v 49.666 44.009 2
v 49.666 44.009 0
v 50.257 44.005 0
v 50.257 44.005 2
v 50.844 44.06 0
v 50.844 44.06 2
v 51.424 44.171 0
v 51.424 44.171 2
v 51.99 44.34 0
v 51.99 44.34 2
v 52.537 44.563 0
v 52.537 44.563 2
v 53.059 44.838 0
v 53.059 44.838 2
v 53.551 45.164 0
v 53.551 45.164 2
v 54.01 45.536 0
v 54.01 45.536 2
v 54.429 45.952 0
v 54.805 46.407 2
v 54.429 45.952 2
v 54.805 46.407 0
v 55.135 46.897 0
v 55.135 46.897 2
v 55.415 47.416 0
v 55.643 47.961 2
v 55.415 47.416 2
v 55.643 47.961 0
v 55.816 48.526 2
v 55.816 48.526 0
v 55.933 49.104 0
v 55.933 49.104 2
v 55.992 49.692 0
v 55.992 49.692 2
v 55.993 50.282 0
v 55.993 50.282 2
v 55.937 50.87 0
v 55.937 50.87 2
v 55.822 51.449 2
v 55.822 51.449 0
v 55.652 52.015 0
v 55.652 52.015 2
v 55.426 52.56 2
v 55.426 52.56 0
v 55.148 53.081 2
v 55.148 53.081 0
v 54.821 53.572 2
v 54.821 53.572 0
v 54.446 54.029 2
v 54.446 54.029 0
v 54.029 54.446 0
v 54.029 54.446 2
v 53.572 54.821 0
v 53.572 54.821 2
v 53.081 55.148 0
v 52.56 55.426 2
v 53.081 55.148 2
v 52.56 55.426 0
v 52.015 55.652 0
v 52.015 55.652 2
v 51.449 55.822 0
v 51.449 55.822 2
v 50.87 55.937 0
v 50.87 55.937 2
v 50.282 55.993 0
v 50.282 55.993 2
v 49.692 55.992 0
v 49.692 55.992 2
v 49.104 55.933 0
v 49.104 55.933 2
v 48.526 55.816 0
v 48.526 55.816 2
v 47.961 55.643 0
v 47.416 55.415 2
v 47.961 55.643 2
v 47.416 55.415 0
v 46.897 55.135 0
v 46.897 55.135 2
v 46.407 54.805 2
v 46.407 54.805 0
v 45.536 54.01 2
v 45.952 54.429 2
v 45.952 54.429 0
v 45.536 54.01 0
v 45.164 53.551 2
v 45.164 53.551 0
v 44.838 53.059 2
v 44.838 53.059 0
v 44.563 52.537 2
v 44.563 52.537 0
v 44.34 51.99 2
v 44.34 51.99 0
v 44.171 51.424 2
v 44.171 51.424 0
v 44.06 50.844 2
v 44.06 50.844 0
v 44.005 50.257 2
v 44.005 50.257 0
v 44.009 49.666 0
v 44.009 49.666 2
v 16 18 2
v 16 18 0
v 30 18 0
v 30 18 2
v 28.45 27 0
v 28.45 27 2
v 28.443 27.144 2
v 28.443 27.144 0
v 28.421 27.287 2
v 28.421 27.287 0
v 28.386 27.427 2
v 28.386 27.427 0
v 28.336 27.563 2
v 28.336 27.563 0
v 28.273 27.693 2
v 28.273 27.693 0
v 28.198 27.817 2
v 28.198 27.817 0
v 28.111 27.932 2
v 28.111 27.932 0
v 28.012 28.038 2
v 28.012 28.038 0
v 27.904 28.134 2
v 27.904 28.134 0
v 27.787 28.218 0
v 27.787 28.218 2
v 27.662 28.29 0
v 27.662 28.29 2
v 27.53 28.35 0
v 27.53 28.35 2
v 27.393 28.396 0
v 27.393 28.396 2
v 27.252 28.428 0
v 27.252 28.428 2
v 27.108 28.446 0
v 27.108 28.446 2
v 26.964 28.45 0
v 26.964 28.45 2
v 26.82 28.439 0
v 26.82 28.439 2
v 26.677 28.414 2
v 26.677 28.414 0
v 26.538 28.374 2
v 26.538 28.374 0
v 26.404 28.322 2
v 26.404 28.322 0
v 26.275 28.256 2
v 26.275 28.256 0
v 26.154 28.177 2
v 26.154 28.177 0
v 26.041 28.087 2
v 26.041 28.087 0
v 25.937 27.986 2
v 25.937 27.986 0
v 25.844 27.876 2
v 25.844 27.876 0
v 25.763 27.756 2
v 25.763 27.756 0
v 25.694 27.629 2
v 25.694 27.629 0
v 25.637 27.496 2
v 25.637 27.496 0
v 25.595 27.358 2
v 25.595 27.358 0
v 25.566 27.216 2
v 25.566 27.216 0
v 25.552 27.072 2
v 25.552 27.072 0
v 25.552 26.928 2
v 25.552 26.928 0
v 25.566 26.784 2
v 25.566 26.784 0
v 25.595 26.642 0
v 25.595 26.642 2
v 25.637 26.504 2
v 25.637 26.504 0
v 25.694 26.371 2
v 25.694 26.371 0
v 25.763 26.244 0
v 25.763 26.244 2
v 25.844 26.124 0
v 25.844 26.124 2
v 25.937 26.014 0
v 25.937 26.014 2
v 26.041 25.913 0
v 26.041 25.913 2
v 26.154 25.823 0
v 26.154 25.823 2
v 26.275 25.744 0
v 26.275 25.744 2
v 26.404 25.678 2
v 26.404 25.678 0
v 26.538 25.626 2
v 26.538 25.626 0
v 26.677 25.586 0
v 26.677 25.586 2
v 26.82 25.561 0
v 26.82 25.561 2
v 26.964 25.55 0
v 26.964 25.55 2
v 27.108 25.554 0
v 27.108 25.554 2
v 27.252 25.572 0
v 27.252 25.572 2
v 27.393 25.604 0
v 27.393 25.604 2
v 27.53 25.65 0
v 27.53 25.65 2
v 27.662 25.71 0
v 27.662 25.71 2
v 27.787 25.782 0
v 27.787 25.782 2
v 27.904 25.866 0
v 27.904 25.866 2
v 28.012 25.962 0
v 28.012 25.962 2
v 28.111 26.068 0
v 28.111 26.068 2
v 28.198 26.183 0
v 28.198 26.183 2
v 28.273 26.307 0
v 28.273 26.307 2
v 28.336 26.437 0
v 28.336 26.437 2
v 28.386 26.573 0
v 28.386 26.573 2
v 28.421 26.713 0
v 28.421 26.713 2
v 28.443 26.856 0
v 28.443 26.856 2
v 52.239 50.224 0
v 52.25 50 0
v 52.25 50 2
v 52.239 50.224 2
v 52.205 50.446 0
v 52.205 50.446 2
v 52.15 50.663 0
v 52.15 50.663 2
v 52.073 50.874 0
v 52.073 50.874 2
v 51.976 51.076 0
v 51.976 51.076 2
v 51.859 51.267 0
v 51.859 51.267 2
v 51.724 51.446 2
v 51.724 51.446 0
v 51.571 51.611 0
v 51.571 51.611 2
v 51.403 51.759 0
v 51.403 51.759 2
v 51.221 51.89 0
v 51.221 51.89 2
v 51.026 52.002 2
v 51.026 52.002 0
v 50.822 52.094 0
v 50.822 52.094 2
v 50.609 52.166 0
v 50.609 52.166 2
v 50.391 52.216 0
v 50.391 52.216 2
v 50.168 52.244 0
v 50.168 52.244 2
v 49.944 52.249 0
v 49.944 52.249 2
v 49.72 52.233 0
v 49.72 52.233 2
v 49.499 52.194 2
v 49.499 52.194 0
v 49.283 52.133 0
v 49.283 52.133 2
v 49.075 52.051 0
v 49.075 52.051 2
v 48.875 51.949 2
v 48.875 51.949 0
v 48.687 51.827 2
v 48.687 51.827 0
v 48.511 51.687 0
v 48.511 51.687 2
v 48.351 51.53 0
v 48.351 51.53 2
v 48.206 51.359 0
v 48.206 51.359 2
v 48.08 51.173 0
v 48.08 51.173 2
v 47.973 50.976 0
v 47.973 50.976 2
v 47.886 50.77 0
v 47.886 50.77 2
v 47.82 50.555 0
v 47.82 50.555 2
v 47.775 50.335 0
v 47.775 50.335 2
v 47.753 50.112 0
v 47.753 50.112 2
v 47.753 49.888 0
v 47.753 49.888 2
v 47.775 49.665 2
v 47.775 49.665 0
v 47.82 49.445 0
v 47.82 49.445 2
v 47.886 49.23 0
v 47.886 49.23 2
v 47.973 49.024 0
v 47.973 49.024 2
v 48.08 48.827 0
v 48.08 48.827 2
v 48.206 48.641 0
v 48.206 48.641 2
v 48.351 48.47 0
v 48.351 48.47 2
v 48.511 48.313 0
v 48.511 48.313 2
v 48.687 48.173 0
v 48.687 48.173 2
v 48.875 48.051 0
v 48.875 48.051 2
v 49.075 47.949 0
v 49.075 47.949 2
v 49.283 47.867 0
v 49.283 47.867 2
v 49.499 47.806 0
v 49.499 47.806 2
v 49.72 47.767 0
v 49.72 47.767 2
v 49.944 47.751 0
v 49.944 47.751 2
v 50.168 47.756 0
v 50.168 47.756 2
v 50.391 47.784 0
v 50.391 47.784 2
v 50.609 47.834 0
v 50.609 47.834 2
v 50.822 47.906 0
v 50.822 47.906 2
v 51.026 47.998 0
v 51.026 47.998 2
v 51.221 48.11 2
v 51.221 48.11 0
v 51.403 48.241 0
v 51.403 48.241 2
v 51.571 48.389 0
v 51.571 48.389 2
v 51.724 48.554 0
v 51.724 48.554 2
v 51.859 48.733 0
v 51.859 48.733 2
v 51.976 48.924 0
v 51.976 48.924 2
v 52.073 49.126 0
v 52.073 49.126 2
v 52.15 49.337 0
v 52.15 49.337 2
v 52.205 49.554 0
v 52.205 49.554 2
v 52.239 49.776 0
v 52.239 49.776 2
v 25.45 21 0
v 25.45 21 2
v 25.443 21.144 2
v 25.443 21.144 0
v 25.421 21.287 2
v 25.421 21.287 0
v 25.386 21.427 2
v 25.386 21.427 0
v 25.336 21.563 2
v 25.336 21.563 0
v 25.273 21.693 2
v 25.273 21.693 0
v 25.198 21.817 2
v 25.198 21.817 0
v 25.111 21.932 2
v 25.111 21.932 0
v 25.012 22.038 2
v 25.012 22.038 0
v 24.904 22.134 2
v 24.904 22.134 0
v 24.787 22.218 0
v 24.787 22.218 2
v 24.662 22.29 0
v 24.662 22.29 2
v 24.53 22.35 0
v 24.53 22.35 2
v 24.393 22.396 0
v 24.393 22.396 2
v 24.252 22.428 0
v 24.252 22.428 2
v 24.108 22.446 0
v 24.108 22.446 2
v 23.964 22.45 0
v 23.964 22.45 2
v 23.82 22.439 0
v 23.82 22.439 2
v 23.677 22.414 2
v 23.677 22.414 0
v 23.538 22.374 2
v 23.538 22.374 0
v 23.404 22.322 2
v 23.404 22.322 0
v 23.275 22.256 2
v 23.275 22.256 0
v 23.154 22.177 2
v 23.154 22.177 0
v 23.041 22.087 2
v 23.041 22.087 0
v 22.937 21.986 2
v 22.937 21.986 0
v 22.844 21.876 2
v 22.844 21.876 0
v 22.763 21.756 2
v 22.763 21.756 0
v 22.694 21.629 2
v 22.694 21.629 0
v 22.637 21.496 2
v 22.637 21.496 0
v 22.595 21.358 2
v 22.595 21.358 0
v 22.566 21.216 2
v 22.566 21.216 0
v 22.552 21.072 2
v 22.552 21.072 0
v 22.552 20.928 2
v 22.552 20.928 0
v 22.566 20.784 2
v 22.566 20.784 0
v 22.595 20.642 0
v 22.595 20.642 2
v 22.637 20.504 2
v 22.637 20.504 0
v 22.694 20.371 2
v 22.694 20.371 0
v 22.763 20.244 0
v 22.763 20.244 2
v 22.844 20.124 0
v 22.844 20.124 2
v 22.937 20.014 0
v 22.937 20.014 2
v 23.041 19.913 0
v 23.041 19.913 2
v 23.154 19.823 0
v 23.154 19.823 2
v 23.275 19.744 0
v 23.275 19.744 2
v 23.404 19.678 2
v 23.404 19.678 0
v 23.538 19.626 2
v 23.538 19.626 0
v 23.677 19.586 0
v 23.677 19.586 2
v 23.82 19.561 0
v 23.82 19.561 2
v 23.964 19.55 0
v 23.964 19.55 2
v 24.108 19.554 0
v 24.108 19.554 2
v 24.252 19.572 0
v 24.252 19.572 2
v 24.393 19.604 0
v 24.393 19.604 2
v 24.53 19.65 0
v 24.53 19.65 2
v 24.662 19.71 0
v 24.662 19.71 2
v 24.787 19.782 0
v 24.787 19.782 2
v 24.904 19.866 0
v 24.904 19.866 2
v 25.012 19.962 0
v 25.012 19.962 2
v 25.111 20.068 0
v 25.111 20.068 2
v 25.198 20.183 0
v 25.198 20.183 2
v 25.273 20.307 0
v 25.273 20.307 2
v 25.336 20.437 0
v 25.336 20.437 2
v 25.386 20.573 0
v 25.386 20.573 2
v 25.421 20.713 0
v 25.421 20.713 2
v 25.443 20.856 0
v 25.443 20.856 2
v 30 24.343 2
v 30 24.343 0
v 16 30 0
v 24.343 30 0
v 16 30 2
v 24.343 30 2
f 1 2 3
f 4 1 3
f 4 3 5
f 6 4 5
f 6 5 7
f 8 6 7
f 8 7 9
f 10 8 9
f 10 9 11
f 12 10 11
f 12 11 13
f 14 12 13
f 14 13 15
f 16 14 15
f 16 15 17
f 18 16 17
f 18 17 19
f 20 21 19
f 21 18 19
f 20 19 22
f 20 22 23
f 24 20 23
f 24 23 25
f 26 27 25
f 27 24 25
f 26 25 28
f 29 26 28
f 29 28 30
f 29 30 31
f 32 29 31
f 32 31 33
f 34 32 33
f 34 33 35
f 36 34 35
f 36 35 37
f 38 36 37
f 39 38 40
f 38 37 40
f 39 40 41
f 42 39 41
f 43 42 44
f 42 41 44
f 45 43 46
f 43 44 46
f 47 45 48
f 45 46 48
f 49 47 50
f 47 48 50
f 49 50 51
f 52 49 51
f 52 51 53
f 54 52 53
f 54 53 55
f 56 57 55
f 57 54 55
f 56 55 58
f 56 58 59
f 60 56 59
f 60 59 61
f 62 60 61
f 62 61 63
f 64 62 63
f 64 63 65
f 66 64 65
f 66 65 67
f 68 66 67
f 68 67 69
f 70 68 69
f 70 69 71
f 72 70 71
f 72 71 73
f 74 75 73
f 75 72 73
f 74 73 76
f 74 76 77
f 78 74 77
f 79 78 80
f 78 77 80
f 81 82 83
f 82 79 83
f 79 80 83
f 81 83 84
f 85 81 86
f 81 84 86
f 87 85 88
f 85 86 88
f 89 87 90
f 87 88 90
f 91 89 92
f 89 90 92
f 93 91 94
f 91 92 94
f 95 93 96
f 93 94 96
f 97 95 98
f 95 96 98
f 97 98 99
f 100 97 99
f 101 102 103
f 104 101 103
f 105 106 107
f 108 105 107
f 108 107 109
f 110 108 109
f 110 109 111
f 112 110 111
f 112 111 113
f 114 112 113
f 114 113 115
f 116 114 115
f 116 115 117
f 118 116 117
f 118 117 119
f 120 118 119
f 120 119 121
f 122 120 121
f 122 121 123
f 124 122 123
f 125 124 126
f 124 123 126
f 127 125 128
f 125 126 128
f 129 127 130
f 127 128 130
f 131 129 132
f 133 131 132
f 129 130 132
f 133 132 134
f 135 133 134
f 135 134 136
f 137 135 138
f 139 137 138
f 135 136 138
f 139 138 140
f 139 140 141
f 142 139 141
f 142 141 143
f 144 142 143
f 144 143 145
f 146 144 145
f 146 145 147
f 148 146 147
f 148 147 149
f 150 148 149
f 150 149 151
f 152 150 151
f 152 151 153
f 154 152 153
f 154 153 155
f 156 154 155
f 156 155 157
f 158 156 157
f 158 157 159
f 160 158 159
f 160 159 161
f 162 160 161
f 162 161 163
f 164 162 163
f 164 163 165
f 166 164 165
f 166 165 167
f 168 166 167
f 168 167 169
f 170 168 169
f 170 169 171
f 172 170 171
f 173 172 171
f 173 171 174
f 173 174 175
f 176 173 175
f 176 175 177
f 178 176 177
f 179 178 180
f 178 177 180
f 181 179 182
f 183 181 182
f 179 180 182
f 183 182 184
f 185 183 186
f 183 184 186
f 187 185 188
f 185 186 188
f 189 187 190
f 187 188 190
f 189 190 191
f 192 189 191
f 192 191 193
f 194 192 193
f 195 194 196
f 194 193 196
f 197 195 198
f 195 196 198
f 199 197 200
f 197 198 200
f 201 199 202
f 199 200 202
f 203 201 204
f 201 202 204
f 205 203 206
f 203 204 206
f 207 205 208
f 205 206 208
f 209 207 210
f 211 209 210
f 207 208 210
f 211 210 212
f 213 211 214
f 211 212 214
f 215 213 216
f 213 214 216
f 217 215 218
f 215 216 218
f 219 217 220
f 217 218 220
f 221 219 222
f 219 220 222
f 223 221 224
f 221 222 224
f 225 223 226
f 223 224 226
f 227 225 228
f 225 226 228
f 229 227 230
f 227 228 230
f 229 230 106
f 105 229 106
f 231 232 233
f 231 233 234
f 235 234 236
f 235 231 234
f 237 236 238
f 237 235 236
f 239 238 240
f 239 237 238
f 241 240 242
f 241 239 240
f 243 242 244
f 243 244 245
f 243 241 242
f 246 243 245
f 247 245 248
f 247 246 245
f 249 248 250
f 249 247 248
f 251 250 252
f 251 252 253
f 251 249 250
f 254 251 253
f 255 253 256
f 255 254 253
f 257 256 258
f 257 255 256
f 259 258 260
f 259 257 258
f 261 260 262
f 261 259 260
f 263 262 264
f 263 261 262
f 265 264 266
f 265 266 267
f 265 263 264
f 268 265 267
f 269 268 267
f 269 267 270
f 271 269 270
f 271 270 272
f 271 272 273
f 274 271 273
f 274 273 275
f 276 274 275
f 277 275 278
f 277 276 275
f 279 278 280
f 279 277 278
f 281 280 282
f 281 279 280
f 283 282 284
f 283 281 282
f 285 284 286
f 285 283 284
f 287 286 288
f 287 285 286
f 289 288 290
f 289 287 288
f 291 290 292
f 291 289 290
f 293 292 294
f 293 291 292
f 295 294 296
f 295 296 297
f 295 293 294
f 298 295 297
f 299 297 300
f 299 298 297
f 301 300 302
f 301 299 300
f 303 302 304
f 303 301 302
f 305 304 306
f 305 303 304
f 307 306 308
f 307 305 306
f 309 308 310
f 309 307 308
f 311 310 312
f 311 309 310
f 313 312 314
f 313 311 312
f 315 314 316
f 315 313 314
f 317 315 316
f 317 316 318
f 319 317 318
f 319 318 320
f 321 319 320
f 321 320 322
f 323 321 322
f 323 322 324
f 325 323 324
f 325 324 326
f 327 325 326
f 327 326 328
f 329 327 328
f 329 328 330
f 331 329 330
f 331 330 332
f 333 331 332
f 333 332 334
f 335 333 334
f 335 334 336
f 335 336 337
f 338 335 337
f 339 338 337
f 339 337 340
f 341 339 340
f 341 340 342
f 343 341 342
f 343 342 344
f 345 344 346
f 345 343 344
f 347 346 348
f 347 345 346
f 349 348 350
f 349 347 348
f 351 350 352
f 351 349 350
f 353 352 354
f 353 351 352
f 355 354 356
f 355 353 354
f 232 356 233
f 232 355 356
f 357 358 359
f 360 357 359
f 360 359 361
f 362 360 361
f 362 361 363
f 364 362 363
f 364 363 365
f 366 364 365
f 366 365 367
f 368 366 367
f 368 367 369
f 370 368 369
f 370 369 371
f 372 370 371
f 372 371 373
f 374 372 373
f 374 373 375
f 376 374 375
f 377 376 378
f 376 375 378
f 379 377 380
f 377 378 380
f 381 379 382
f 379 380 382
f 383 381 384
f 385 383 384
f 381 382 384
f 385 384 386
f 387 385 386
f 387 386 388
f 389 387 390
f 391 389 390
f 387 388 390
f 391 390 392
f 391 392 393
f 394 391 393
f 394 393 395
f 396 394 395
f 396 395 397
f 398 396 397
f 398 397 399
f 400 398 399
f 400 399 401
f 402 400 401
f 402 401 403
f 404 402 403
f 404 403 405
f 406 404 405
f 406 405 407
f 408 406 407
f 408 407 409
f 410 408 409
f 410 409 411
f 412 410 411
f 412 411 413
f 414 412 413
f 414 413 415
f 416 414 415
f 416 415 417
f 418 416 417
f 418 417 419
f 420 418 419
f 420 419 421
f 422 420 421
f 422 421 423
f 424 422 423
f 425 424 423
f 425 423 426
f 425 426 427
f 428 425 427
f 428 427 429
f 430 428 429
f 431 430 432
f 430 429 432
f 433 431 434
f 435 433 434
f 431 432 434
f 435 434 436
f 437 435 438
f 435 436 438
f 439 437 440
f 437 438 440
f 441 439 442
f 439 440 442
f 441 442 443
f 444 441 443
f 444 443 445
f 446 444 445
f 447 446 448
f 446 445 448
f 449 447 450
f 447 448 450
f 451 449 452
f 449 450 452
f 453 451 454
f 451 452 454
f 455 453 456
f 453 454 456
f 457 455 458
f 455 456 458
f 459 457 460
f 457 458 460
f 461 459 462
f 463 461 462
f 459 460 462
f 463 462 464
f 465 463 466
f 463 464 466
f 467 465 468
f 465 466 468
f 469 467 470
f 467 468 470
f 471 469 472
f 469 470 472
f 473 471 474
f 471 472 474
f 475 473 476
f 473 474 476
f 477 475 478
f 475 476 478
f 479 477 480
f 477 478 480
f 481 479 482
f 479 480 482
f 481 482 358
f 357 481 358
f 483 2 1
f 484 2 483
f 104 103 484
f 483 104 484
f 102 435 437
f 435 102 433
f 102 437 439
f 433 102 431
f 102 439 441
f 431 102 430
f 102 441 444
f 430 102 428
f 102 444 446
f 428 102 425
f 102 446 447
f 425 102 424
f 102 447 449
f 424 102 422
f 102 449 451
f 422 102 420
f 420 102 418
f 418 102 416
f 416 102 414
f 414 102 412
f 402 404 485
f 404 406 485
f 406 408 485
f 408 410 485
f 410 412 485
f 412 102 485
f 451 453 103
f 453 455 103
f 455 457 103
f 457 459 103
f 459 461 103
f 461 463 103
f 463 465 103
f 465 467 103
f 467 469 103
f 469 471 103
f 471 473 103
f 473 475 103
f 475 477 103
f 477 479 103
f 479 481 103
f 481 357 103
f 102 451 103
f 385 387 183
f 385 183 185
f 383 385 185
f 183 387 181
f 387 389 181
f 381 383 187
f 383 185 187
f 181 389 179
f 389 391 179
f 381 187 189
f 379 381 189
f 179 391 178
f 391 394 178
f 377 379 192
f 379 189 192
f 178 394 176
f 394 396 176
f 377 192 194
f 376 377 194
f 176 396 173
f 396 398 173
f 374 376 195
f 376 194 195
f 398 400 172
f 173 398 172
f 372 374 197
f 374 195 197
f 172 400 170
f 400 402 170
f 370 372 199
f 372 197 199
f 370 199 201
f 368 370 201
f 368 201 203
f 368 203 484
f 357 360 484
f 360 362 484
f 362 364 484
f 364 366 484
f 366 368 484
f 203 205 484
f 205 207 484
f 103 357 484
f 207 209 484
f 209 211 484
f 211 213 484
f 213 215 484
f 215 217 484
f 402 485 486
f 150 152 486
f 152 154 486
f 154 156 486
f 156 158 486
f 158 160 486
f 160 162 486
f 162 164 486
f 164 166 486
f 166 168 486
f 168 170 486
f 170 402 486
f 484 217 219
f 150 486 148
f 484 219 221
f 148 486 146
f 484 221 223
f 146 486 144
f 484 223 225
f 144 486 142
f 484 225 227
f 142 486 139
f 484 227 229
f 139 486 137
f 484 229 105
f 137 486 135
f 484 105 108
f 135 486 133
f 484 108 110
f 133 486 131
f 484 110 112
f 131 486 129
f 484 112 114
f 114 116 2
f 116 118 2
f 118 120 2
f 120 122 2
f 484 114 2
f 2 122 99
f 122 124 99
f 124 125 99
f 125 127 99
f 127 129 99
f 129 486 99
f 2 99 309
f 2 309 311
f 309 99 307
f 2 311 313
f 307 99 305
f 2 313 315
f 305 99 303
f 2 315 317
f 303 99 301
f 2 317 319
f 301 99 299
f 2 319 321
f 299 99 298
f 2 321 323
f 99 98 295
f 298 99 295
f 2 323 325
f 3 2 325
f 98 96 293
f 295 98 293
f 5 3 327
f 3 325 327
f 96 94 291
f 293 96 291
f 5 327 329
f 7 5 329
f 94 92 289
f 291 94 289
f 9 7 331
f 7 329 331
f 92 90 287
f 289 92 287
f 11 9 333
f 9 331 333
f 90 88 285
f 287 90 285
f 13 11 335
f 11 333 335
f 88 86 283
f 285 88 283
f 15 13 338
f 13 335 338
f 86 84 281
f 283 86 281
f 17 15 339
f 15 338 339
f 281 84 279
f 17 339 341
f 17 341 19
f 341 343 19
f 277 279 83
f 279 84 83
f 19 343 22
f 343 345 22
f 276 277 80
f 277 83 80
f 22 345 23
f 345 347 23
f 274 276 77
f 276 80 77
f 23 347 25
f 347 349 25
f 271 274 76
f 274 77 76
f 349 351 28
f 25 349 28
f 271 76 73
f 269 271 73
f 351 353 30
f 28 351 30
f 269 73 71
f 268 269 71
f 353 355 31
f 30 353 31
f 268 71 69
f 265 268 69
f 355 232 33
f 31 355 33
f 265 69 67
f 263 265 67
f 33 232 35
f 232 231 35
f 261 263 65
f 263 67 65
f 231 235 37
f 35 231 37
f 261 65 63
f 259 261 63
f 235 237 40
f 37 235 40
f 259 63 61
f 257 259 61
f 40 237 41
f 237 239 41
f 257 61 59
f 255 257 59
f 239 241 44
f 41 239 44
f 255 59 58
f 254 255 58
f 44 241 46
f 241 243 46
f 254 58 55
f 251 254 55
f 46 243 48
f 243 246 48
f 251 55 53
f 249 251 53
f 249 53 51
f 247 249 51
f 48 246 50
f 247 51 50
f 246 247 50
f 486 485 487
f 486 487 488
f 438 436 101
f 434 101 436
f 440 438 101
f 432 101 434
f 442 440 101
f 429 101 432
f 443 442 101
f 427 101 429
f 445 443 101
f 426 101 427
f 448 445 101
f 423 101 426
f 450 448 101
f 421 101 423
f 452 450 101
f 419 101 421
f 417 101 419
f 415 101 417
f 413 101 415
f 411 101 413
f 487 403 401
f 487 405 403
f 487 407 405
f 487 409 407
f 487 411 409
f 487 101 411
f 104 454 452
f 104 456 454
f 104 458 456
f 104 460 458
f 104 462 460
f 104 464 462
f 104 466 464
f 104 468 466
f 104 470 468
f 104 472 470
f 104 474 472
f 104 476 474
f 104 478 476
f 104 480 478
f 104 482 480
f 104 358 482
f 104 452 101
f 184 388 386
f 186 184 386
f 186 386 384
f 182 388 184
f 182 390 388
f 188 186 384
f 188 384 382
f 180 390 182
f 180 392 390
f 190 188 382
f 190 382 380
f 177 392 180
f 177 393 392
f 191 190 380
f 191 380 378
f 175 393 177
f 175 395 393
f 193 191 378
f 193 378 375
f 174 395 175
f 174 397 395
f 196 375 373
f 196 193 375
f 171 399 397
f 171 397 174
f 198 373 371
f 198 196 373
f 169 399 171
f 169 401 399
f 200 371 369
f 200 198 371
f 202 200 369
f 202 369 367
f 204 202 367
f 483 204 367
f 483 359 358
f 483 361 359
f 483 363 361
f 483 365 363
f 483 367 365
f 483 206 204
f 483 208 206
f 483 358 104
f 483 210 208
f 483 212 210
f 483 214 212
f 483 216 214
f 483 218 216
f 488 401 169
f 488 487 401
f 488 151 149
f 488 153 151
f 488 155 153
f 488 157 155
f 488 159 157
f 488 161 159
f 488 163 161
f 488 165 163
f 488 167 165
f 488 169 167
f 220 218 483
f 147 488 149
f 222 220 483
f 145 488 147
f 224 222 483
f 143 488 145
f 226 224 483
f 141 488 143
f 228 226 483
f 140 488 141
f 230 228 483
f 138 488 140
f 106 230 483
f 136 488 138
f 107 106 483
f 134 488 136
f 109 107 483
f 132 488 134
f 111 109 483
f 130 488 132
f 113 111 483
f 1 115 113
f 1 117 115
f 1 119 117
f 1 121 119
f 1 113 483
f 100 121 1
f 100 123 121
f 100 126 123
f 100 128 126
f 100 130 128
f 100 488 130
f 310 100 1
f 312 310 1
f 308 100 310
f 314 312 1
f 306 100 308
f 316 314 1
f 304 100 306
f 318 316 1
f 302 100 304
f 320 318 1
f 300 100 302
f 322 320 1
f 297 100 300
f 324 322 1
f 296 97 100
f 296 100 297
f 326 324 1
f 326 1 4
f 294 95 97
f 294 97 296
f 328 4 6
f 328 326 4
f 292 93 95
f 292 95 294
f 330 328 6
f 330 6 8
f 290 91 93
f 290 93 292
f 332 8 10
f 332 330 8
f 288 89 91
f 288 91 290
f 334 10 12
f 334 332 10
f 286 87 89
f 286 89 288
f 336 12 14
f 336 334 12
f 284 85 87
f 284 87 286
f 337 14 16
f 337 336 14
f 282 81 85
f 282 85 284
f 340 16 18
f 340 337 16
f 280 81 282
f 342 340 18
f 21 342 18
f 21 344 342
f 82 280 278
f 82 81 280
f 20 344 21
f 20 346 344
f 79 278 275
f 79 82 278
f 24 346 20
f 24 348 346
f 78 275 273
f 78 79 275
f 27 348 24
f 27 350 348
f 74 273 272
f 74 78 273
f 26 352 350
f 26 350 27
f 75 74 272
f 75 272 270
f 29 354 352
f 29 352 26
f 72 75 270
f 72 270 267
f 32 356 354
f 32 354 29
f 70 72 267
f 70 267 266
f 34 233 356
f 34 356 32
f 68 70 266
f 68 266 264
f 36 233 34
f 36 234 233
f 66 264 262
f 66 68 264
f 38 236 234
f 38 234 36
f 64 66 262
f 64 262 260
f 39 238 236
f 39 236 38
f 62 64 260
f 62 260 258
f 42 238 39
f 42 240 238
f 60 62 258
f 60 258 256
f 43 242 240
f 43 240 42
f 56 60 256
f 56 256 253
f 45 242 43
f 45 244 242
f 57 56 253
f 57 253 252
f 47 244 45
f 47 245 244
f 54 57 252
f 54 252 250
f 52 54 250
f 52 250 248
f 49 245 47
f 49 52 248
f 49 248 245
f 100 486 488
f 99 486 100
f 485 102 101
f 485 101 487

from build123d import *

# Parameters (mm, degrees)
SKETCH1_R                         = 6
SKETCH1_R_2                       = 2.25
FOLLOWER_SEAT_D4P5_DEPTH          = 2
CARRIAGE_TO_FOLLOWER_BRIDGE_DEPTH = 2
SKETCH3_W                         = 14
SKETCH3_H                         = 12
CARRIAGE_ATTACHMENT_PAD_DEPTH     = 2
SKETCH5_R                         = 1.45
STOP_MOUNT_D2P9_THROUGH_DEPTH     = 2.01


with BuildPart() as part:
    # Sketch1 → Follower_Seat_D4p5 (new body)
    with BuildSketch(Plane.XY):
        with Locations((50, 50)):
            Circle(SKETCH1_R)
        with Locations((50, 50)):
            Circle(SKETCH1_R_2, mode=Mode.SUBTRACT)
    extrude(amount=FOLLOWER_SEAT_D4P5_DEPTH)

    # Sketch2 → Carriage_To_Follower_Bridge (add)
    with BuildSketch(Plane.XY):
        Polygon((21.171572875, 26.828427125), (44.171572875, 49.828427125), (49.828427125, 44.171572875), (26.828427125, 21.171572875), align=None)
    extrude(amount=CARRIAGE_TO_FOLLOWER_BRIDGE_DEPTH)

    # Sketch3 → Carriage_Attachment_Pad (add)
    with BuildSketch(Plane.XY):
        with Locations((23, 24)):
            Rectangle(SKETCH3_W, SKETCH3_H)
    extrude(amount=CARRIAGE_ATTACHMENT_PAD_DEPTH)

    # Sketch5 → Stop_Mount_D2p9_Through (cut)
    with BuildSketch(Plane.XY.offset(2)):
        with Locations((24, 21)):
            Circle(SKETCH5_R)
        with Locations((27, 27)):
            Circle(SKETCH5_R)
    extrude(amount=-STOP_MOUNT_D2P9_THROUGH_DEPTH, mode=Mode.SUBTRACT)


solid = part.part
